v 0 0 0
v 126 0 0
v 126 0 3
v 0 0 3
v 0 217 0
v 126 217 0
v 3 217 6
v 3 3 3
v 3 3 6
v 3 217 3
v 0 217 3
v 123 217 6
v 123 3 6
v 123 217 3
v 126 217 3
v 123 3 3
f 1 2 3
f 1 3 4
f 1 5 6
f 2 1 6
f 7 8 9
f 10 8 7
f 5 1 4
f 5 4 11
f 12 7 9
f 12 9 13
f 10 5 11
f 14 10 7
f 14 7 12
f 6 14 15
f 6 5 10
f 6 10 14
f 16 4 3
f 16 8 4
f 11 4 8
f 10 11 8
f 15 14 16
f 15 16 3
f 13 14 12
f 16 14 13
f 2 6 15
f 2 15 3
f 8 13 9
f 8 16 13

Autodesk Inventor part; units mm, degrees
ref_plane "YZ Plane" through (0, 0, 0) normal (1, 0, 0) x (0, 1, 0)
ref_plane "XZ Plane" through (0, 0, 0) normal (0, 1, 0) x (-1, 0, 0)
ref_plane "XY Plane" through (0, 0, 0) normal (0, 0, 1) x (1, 0, 0)
sketch "Sketch1" plane through (0, 0, 0) normal (0, 0, 1) x (1, 0, 0)
  line L0 (0, 217) -> (126, 217)
  line L1 (126, 217) -> (126, 0)
  line L2 (126, 0) -> (0, 0)
  line L3 (0, 0) -> (0, 217)
  dimension "d0" = 126
  dimension "d1" = 217
extrude "Extrusion1" add sketch "Sketch1" along normal blind 3
sketch "Sketch2" plane through (0, 0, 3) normal (0, 0, 1) x (1, 0, 0)
  line L0 (0, 0) -> (126, 0) projected
  line L1 (126, 0) -> (126, 217) projected
  line L2 (126, 217) -> (0, 217) projected
  line L3 (0, 217) -> (0, 0) projected
  line L4 (3, 217) -> (123, 217)
  line L5 (123, 217) -> (123, 3)
  line L6 (123, 3) -> (3, 3)
  line L7 (3, 3) -> (3, 217)
  dimension "d4" = 3
  dimension "d5" = 3
  dimension "d6" = 3
extrude "Extrusion2" add sketch "Sketch2" along normal blind 3 contours L2 L5 L6 L7
properties part number "Tapa pared falsa"
